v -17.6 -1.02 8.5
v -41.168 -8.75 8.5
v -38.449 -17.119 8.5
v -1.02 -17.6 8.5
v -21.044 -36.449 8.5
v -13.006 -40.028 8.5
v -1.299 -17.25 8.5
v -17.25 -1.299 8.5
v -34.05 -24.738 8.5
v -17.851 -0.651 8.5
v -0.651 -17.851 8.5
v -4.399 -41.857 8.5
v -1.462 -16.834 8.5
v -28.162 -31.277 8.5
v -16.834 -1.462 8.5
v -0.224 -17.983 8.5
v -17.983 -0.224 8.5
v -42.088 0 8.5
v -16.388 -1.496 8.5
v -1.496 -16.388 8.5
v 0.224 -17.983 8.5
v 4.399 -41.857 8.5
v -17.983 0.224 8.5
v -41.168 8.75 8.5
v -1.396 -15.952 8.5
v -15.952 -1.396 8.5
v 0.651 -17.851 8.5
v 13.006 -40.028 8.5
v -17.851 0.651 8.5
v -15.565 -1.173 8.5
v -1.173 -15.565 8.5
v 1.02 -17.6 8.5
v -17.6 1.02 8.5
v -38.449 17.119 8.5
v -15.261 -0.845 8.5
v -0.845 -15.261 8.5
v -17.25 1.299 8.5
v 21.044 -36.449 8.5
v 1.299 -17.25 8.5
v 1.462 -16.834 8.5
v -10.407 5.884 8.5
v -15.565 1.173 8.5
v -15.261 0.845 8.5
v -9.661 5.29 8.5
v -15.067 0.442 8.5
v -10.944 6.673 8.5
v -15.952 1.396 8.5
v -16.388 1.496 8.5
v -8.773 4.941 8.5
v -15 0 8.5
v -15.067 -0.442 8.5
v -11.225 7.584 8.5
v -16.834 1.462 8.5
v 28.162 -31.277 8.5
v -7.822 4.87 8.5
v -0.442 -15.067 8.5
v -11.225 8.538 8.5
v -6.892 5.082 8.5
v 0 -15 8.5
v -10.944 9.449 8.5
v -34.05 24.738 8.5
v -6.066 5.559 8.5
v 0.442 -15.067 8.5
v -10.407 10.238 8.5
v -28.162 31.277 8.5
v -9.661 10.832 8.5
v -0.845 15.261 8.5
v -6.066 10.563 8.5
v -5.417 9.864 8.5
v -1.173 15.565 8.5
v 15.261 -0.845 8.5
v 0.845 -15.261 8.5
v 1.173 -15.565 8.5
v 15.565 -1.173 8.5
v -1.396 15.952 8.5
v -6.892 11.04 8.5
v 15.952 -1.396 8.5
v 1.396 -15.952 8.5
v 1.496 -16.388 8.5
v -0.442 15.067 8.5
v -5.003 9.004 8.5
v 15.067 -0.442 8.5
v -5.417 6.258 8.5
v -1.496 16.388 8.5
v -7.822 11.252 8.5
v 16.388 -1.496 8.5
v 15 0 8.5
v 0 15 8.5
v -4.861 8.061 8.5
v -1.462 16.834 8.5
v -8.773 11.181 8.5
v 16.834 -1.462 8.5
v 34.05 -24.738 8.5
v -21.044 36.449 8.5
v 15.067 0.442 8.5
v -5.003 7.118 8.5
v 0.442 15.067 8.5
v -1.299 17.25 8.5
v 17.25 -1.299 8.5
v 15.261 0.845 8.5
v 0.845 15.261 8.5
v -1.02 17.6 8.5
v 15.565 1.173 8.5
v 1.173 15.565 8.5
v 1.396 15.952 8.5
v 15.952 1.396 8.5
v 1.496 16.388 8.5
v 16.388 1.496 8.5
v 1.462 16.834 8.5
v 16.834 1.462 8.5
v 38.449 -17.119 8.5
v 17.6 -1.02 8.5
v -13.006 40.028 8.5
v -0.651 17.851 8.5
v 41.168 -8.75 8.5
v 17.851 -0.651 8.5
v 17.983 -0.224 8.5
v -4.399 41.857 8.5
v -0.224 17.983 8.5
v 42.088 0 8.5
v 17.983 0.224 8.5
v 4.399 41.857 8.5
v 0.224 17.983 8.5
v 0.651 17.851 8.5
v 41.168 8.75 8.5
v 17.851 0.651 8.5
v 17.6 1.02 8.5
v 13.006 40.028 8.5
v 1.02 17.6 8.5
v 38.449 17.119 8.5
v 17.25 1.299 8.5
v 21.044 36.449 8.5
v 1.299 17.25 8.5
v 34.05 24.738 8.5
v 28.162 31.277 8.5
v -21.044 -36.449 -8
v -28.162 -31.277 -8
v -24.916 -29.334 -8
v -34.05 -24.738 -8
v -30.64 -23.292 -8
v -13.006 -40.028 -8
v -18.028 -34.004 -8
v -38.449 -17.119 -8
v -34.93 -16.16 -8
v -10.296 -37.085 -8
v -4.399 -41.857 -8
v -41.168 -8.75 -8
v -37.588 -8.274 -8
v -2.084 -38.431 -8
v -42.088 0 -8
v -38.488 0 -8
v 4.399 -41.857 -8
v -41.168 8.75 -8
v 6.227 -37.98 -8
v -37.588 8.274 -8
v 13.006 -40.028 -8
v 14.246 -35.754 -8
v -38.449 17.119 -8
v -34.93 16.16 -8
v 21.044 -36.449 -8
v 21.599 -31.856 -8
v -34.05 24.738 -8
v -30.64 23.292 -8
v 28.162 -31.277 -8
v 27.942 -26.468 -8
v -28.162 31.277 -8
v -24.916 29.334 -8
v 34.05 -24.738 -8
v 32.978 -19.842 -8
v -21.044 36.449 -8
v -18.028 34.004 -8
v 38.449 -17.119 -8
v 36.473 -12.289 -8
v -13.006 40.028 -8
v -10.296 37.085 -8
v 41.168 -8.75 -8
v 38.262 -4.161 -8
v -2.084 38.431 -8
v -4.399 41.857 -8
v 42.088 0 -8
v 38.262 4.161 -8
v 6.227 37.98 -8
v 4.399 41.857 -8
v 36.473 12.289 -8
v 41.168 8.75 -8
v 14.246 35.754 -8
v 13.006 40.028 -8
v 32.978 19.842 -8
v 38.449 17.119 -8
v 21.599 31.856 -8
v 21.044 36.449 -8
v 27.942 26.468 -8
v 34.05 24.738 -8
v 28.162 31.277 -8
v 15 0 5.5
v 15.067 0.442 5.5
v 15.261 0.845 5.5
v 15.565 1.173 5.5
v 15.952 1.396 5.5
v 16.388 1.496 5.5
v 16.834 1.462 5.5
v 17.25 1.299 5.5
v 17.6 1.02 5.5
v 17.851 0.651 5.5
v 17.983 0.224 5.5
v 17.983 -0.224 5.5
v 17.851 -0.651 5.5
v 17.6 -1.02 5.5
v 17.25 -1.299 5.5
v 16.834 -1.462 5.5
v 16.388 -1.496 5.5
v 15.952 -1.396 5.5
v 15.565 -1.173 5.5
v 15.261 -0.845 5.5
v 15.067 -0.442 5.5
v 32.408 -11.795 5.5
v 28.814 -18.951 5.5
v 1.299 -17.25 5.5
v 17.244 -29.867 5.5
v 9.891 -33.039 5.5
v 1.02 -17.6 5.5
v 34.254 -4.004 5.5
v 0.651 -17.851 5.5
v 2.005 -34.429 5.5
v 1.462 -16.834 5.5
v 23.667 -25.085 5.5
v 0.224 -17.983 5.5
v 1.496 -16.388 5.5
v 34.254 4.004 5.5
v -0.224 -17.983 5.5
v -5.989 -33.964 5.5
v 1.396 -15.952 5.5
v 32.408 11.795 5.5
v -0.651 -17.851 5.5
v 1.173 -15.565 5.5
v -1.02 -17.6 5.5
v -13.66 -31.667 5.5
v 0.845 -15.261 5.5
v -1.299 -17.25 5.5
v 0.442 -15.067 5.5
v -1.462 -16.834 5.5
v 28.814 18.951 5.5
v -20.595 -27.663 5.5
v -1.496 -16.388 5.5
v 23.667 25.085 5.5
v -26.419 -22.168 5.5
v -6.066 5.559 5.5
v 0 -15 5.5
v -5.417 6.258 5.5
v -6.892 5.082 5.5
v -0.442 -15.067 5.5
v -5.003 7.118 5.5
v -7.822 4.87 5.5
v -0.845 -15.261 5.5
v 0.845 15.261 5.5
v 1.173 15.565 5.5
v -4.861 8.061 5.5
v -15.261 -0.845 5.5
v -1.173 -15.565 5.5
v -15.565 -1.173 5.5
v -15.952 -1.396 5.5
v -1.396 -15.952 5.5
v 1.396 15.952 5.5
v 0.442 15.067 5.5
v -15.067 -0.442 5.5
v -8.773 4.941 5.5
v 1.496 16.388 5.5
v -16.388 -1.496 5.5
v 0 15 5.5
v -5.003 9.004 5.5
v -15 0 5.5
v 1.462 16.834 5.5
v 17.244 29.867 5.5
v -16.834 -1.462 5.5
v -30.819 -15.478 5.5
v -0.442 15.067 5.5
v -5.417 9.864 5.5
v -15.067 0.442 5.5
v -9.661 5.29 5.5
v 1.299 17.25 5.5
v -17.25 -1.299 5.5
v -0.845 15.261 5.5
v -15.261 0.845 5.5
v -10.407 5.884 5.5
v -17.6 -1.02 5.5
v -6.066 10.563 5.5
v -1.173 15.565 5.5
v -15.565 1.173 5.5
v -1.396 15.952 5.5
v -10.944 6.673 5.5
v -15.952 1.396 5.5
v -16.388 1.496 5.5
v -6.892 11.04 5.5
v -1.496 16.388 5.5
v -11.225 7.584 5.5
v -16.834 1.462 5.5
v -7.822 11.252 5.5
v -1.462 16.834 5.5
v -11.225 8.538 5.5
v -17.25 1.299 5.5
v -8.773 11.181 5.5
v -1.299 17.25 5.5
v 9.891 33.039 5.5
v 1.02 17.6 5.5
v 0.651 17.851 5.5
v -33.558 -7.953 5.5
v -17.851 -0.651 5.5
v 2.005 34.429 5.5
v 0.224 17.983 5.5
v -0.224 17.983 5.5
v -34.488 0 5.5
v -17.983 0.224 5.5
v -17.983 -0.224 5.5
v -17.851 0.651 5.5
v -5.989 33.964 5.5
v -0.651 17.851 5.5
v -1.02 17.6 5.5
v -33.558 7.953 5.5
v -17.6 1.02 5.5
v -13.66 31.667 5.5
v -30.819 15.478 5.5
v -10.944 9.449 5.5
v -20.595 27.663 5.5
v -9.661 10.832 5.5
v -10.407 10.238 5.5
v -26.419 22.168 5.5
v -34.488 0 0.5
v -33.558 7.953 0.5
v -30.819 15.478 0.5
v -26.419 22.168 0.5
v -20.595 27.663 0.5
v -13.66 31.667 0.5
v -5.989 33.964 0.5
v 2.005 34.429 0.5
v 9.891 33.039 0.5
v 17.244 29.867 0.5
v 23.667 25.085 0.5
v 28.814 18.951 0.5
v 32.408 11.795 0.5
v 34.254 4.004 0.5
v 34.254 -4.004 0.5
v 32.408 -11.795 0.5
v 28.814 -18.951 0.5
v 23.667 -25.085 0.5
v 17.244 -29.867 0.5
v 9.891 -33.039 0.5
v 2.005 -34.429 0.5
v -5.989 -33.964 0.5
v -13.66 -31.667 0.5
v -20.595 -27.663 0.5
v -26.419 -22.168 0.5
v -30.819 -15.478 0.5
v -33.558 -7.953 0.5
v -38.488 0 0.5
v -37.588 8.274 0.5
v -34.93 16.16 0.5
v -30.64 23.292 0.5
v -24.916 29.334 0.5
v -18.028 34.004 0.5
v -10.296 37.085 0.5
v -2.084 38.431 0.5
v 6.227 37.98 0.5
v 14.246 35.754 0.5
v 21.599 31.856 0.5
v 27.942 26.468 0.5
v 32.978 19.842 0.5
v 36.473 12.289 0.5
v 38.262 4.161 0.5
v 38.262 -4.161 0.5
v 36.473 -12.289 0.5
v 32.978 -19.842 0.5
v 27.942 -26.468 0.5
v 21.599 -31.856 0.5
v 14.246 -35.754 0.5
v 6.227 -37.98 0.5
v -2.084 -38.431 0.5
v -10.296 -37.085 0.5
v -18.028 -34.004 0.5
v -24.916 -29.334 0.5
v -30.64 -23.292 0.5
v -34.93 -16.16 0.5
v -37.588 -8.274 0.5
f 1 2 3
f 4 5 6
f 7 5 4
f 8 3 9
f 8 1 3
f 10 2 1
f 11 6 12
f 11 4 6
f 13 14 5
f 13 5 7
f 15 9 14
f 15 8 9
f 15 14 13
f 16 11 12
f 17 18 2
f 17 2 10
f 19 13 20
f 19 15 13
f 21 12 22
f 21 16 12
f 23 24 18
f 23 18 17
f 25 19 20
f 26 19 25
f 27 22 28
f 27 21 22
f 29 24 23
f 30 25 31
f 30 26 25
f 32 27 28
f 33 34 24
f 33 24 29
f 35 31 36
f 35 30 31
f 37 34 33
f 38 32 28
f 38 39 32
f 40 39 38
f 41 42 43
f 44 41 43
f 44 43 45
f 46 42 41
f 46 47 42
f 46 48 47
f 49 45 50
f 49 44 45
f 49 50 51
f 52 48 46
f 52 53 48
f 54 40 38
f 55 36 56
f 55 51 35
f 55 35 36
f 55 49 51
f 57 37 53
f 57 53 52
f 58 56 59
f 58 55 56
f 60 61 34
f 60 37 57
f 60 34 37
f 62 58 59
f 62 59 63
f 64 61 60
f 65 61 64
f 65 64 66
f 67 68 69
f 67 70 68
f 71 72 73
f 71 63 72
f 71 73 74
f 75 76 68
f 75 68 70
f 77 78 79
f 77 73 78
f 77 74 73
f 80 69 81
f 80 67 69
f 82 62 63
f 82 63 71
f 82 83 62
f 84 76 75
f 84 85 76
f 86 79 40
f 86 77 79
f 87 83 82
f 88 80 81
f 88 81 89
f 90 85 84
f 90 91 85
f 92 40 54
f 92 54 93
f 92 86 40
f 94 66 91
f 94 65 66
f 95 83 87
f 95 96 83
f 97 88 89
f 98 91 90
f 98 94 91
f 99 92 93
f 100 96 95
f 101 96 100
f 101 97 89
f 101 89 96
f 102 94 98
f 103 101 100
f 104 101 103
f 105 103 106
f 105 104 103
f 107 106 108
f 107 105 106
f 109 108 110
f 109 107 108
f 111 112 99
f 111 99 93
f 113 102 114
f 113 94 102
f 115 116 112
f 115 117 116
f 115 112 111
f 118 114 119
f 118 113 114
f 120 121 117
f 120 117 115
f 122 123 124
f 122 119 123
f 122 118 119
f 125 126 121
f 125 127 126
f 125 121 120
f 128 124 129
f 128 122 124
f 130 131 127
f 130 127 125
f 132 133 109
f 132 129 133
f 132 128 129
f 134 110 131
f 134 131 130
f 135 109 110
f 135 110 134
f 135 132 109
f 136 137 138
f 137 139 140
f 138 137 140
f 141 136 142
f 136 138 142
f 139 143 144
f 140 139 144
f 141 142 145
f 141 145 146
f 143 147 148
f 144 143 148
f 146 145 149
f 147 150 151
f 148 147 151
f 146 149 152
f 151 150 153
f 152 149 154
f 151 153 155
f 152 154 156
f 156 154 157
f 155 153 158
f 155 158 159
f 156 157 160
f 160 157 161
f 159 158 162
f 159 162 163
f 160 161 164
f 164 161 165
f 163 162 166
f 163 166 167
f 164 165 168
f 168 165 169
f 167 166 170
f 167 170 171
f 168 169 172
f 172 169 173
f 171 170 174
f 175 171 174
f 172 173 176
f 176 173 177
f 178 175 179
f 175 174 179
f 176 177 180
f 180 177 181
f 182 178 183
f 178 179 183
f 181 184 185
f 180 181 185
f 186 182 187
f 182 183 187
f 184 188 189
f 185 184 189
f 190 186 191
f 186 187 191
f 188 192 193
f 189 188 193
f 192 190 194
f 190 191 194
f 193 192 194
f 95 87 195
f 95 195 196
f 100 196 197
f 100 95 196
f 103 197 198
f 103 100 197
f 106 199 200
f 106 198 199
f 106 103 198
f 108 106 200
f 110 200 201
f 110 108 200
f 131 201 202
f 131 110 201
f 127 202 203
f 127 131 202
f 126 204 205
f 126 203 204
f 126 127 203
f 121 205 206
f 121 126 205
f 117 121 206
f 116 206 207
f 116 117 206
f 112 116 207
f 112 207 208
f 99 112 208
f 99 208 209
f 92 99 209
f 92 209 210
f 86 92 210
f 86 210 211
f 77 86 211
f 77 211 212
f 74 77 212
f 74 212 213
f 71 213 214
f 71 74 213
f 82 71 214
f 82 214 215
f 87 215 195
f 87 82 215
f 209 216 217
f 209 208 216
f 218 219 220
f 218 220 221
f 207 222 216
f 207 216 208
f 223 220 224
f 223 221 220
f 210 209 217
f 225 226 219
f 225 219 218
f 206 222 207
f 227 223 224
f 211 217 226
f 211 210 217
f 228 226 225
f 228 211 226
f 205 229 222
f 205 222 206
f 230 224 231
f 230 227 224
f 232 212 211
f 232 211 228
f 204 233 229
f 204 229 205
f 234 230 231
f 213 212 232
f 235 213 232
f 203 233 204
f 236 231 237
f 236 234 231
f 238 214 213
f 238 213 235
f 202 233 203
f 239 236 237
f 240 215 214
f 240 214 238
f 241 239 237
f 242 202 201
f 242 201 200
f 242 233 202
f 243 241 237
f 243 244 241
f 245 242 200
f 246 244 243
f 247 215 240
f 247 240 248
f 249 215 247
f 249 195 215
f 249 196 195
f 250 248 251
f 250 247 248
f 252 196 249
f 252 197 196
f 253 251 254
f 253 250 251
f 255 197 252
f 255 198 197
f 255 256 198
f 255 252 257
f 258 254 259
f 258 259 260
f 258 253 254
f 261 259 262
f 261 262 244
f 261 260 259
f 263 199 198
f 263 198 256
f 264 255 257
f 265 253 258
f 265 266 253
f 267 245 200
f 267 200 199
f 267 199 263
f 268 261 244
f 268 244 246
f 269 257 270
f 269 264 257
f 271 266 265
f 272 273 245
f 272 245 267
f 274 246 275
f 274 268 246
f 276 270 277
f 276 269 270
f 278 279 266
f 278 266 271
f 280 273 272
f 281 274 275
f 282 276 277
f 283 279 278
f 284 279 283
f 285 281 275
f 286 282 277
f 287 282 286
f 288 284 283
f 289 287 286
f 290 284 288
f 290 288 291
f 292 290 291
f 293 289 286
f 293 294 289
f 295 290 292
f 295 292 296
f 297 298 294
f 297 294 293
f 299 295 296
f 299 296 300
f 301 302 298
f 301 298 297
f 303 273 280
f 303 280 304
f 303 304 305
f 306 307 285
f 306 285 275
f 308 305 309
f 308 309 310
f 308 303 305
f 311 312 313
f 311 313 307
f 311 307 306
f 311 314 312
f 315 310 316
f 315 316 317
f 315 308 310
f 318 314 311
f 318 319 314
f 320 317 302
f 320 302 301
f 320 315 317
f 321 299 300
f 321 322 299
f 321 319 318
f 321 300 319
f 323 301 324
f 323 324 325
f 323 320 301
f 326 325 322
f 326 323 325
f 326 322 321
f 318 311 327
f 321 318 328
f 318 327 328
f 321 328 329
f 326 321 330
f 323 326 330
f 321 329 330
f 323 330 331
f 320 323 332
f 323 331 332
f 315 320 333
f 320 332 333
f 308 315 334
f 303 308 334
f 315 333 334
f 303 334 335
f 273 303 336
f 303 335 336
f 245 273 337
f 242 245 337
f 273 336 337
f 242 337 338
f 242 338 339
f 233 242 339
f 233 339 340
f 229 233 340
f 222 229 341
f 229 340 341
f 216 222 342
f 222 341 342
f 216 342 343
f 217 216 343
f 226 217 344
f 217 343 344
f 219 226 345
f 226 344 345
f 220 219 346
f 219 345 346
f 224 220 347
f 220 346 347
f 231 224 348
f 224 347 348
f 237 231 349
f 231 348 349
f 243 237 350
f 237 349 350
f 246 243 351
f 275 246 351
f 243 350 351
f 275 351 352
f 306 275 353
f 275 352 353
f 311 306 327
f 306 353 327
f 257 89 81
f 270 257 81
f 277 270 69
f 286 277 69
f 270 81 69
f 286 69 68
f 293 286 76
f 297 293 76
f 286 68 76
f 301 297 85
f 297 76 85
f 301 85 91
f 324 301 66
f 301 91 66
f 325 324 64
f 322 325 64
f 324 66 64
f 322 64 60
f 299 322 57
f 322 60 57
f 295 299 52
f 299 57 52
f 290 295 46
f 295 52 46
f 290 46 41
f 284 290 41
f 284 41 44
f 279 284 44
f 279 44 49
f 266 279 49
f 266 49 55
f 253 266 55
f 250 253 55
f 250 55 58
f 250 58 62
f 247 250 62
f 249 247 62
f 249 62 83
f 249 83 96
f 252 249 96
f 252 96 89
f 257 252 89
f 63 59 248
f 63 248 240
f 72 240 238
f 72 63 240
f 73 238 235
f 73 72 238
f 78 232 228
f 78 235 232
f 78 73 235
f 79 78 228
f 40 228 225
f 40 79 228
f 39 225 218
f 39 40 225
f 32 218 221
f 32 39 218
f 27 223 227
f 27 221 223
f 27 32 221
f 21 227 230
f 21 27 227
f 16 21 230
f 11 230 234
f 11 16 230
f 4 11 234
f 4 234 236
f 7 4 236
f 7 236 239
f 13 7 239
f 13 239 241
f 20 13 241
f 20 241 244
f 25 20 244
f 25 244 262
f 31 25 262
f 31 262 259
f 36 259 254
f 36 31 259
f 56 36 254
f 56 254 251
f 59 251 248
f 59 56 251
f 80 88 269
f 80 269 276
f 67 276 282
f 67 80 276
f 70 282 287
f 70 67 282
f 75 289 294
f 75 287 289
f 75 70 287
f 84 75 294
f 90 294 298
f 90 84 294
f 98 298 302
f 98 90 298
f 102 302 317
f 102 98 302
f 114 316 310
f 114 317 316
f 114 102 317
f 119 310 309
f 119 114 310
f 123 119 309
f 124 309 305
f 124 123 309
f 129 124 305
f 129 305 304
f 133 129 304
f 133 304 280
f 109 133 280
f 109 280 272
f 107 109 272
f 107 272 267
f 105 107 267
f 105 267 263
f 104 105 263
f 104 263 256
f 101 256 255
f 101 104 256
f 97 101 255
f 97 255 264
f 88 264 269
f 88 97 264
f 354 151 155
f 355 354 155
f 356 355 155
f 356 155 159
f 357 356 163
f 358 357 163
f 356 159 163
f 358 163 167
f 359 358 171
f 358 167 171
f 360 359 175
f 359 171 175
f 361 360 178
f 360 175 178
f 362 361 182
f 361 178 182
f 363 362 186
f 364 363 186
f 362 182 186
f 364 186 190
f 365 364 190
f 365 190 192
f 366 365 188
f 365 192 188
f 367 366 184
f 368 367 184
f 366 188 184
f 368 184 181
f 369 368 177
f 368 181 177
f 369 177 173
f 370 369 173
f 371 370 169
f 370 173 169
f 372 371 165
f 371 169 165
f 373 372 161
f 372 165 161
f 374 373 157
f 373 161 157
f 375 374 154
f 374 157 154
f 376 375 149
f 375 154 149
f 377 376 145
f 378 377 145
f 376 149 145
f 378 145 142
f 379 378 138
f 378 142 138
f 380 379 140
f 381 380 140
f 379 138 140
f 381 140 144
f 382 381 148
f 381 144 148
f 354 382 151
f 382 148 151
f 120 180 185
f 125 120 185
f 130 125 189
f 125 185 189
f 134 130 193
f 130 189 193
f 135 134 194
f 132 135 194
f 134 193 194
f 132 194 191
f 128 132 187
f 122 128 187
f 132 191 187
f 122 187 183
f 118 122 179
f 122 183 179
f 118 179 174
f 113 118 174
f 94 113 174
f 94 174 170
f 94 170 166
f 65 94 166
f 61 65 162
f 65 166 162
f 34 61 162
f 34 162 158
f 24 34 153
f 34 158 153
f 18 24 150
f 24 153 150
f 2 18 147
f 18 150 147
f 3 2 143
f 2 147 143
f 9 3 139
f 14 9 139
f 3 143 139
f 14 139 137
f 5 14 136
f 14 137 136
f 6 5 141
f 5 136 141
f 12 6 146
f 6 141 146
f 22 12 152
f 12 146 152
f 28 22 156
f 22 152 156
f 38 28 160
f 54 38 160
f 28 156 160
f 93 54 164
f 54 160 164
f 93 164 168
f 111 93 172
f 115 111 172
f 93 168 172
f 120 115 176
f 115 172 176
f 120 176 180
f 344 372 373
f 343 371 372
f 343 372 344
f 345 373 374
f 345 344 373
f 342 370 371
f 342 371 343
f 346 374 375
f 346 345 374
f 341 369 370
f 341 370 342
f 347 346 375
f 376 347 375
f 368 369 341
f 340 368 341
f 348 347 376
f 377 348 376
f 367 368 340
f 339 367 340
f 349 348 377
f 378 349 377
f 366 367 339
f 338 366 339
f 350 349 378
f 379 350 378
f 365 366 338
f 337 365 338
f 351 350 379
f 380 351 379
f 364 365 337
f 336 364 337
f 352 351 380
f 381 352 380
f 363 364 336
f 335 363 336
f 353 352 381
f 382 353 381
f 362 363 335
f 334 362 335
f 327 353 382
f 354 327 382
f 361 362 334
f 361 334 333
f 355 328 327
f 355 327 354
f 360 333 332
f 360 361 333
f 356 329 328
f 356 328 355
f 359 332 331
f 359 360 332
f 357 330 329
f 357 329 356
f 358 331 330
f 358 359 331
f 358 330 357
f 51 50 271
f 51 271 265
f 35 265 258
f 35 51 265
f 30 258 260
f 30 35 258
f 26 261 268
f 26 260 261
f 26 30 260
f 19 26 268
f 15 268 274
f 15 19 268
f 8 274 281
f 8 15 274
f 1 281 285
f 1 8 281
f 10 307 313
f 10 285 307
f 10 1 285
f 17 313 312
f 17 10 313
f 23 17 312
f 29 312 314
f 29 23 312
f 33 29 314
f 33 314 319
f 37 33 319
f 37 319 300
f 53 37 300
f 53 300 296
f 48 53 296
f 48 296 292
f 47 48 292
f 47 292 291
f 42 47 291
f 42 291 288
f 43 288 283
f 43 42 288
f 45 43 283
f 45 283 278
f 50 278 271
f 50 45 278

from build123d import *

# Parameters (mm, degrees)
SKETCH1_R               = 42.0875
BOSS_EXTRUDE1_DEPTH     = 16.5
SKETCH2_R               = 38.4875
CUT_EXTRUDE1_DEPTH      = 8.5
SKETCH3_R               = 34.4875
CUT_EXTRUDE2_DEPTH      = 5
SKETCH5_R               = 3.2
CUT_EXTRUDE4_DEPTH      = 1
CUT_EXTRUDE4_DEPTH_BACK = 17.5
CUT_EXTRUDE3_START      = -4
SKETCH4_R               = 1.5
CUT_EXTRUDE3_DEPTH      = 18.5
CIRPATTERN1_COUNT       = 4


with BuildPart() as part:
    # Sketch1 → Boss-Extrude1 (new body)
    with BuildSketch(Plane.XY.offset(-8)):
        Circle(SKETCH1_R)
    extrude(amount=BOSS_EXTRUDE1_DEPTH)

    # Sketch2 → Cut-Extrude1 (cut)
    with BuildSketch(Plane(origin=(0, 0, -8), x_dir=(-1, 0, 0), z_dir=(0, 0, -1))):
        Circle(SKETCH2_R)
    extrude(amount=-CUT_EXTRUDE1_DEPTH, mode=Mode.SUBTRACT)

    # Sketch3 → Cut-Extrude2 (cut)
    with BuildSketch(Plane(origin=(0, 0, 0.5), x_dir=(-1, 0, 0), z_dir=(0, 0, -1))):
        Circle(SKETCH3_R)
    extrude(amount=-CUT_EXTRUDE2_DEPTH, mode=Mode.SUBTRACT)

    # Sketch5 → Cut-Extrude4 (cut, two sides)
    with BuildSketch(Plane.XY.offset(8.5)) as cut_extrude4_sk:
        with Locations((-8.061017306, 8.061017306)):
            Circle(SKETCH5_R)
    extrude(amount=CUT_EXTRUDE4_DEPTH, mode=Mode.SUBTRACT)
    extrude(cut_extrude4_sk.sketch, amount=-CUT_EXTRUDE4_DEPTH_BACK, mode=Mode.SUBTRACT)

    # Sketch4 → Cut-Extrude3 (cut)
    with BuildSketch(Plane(origin=(0, 0, 5.5), x_dir=(-1, 0, 0), z_dir=(0, 0, -1)).offset(CUT_EXTRUDE3_START)):
        with Locations((-16.5, 0)):
            Circle(SKETCH4_R)
    cut_extrude3 = extrude(amount=CUT_EXTRUDE3_DEPTH, mode=Mode.SUBTRACT)

    # CirPattern1: Cut-Extrude3 ×4 about axis
    cirpattern1_axis = Axis((0, 0, 0), (0, 0, 1))
    for i in range(1, CIRPATTERN1_COUNT):
        add(cut_extrude3.rotate(cirpattern1_axis, i * 360 / CIRPATTERN1_COUNT), mode=Mode.SUBTRACT)


solid = part.part
